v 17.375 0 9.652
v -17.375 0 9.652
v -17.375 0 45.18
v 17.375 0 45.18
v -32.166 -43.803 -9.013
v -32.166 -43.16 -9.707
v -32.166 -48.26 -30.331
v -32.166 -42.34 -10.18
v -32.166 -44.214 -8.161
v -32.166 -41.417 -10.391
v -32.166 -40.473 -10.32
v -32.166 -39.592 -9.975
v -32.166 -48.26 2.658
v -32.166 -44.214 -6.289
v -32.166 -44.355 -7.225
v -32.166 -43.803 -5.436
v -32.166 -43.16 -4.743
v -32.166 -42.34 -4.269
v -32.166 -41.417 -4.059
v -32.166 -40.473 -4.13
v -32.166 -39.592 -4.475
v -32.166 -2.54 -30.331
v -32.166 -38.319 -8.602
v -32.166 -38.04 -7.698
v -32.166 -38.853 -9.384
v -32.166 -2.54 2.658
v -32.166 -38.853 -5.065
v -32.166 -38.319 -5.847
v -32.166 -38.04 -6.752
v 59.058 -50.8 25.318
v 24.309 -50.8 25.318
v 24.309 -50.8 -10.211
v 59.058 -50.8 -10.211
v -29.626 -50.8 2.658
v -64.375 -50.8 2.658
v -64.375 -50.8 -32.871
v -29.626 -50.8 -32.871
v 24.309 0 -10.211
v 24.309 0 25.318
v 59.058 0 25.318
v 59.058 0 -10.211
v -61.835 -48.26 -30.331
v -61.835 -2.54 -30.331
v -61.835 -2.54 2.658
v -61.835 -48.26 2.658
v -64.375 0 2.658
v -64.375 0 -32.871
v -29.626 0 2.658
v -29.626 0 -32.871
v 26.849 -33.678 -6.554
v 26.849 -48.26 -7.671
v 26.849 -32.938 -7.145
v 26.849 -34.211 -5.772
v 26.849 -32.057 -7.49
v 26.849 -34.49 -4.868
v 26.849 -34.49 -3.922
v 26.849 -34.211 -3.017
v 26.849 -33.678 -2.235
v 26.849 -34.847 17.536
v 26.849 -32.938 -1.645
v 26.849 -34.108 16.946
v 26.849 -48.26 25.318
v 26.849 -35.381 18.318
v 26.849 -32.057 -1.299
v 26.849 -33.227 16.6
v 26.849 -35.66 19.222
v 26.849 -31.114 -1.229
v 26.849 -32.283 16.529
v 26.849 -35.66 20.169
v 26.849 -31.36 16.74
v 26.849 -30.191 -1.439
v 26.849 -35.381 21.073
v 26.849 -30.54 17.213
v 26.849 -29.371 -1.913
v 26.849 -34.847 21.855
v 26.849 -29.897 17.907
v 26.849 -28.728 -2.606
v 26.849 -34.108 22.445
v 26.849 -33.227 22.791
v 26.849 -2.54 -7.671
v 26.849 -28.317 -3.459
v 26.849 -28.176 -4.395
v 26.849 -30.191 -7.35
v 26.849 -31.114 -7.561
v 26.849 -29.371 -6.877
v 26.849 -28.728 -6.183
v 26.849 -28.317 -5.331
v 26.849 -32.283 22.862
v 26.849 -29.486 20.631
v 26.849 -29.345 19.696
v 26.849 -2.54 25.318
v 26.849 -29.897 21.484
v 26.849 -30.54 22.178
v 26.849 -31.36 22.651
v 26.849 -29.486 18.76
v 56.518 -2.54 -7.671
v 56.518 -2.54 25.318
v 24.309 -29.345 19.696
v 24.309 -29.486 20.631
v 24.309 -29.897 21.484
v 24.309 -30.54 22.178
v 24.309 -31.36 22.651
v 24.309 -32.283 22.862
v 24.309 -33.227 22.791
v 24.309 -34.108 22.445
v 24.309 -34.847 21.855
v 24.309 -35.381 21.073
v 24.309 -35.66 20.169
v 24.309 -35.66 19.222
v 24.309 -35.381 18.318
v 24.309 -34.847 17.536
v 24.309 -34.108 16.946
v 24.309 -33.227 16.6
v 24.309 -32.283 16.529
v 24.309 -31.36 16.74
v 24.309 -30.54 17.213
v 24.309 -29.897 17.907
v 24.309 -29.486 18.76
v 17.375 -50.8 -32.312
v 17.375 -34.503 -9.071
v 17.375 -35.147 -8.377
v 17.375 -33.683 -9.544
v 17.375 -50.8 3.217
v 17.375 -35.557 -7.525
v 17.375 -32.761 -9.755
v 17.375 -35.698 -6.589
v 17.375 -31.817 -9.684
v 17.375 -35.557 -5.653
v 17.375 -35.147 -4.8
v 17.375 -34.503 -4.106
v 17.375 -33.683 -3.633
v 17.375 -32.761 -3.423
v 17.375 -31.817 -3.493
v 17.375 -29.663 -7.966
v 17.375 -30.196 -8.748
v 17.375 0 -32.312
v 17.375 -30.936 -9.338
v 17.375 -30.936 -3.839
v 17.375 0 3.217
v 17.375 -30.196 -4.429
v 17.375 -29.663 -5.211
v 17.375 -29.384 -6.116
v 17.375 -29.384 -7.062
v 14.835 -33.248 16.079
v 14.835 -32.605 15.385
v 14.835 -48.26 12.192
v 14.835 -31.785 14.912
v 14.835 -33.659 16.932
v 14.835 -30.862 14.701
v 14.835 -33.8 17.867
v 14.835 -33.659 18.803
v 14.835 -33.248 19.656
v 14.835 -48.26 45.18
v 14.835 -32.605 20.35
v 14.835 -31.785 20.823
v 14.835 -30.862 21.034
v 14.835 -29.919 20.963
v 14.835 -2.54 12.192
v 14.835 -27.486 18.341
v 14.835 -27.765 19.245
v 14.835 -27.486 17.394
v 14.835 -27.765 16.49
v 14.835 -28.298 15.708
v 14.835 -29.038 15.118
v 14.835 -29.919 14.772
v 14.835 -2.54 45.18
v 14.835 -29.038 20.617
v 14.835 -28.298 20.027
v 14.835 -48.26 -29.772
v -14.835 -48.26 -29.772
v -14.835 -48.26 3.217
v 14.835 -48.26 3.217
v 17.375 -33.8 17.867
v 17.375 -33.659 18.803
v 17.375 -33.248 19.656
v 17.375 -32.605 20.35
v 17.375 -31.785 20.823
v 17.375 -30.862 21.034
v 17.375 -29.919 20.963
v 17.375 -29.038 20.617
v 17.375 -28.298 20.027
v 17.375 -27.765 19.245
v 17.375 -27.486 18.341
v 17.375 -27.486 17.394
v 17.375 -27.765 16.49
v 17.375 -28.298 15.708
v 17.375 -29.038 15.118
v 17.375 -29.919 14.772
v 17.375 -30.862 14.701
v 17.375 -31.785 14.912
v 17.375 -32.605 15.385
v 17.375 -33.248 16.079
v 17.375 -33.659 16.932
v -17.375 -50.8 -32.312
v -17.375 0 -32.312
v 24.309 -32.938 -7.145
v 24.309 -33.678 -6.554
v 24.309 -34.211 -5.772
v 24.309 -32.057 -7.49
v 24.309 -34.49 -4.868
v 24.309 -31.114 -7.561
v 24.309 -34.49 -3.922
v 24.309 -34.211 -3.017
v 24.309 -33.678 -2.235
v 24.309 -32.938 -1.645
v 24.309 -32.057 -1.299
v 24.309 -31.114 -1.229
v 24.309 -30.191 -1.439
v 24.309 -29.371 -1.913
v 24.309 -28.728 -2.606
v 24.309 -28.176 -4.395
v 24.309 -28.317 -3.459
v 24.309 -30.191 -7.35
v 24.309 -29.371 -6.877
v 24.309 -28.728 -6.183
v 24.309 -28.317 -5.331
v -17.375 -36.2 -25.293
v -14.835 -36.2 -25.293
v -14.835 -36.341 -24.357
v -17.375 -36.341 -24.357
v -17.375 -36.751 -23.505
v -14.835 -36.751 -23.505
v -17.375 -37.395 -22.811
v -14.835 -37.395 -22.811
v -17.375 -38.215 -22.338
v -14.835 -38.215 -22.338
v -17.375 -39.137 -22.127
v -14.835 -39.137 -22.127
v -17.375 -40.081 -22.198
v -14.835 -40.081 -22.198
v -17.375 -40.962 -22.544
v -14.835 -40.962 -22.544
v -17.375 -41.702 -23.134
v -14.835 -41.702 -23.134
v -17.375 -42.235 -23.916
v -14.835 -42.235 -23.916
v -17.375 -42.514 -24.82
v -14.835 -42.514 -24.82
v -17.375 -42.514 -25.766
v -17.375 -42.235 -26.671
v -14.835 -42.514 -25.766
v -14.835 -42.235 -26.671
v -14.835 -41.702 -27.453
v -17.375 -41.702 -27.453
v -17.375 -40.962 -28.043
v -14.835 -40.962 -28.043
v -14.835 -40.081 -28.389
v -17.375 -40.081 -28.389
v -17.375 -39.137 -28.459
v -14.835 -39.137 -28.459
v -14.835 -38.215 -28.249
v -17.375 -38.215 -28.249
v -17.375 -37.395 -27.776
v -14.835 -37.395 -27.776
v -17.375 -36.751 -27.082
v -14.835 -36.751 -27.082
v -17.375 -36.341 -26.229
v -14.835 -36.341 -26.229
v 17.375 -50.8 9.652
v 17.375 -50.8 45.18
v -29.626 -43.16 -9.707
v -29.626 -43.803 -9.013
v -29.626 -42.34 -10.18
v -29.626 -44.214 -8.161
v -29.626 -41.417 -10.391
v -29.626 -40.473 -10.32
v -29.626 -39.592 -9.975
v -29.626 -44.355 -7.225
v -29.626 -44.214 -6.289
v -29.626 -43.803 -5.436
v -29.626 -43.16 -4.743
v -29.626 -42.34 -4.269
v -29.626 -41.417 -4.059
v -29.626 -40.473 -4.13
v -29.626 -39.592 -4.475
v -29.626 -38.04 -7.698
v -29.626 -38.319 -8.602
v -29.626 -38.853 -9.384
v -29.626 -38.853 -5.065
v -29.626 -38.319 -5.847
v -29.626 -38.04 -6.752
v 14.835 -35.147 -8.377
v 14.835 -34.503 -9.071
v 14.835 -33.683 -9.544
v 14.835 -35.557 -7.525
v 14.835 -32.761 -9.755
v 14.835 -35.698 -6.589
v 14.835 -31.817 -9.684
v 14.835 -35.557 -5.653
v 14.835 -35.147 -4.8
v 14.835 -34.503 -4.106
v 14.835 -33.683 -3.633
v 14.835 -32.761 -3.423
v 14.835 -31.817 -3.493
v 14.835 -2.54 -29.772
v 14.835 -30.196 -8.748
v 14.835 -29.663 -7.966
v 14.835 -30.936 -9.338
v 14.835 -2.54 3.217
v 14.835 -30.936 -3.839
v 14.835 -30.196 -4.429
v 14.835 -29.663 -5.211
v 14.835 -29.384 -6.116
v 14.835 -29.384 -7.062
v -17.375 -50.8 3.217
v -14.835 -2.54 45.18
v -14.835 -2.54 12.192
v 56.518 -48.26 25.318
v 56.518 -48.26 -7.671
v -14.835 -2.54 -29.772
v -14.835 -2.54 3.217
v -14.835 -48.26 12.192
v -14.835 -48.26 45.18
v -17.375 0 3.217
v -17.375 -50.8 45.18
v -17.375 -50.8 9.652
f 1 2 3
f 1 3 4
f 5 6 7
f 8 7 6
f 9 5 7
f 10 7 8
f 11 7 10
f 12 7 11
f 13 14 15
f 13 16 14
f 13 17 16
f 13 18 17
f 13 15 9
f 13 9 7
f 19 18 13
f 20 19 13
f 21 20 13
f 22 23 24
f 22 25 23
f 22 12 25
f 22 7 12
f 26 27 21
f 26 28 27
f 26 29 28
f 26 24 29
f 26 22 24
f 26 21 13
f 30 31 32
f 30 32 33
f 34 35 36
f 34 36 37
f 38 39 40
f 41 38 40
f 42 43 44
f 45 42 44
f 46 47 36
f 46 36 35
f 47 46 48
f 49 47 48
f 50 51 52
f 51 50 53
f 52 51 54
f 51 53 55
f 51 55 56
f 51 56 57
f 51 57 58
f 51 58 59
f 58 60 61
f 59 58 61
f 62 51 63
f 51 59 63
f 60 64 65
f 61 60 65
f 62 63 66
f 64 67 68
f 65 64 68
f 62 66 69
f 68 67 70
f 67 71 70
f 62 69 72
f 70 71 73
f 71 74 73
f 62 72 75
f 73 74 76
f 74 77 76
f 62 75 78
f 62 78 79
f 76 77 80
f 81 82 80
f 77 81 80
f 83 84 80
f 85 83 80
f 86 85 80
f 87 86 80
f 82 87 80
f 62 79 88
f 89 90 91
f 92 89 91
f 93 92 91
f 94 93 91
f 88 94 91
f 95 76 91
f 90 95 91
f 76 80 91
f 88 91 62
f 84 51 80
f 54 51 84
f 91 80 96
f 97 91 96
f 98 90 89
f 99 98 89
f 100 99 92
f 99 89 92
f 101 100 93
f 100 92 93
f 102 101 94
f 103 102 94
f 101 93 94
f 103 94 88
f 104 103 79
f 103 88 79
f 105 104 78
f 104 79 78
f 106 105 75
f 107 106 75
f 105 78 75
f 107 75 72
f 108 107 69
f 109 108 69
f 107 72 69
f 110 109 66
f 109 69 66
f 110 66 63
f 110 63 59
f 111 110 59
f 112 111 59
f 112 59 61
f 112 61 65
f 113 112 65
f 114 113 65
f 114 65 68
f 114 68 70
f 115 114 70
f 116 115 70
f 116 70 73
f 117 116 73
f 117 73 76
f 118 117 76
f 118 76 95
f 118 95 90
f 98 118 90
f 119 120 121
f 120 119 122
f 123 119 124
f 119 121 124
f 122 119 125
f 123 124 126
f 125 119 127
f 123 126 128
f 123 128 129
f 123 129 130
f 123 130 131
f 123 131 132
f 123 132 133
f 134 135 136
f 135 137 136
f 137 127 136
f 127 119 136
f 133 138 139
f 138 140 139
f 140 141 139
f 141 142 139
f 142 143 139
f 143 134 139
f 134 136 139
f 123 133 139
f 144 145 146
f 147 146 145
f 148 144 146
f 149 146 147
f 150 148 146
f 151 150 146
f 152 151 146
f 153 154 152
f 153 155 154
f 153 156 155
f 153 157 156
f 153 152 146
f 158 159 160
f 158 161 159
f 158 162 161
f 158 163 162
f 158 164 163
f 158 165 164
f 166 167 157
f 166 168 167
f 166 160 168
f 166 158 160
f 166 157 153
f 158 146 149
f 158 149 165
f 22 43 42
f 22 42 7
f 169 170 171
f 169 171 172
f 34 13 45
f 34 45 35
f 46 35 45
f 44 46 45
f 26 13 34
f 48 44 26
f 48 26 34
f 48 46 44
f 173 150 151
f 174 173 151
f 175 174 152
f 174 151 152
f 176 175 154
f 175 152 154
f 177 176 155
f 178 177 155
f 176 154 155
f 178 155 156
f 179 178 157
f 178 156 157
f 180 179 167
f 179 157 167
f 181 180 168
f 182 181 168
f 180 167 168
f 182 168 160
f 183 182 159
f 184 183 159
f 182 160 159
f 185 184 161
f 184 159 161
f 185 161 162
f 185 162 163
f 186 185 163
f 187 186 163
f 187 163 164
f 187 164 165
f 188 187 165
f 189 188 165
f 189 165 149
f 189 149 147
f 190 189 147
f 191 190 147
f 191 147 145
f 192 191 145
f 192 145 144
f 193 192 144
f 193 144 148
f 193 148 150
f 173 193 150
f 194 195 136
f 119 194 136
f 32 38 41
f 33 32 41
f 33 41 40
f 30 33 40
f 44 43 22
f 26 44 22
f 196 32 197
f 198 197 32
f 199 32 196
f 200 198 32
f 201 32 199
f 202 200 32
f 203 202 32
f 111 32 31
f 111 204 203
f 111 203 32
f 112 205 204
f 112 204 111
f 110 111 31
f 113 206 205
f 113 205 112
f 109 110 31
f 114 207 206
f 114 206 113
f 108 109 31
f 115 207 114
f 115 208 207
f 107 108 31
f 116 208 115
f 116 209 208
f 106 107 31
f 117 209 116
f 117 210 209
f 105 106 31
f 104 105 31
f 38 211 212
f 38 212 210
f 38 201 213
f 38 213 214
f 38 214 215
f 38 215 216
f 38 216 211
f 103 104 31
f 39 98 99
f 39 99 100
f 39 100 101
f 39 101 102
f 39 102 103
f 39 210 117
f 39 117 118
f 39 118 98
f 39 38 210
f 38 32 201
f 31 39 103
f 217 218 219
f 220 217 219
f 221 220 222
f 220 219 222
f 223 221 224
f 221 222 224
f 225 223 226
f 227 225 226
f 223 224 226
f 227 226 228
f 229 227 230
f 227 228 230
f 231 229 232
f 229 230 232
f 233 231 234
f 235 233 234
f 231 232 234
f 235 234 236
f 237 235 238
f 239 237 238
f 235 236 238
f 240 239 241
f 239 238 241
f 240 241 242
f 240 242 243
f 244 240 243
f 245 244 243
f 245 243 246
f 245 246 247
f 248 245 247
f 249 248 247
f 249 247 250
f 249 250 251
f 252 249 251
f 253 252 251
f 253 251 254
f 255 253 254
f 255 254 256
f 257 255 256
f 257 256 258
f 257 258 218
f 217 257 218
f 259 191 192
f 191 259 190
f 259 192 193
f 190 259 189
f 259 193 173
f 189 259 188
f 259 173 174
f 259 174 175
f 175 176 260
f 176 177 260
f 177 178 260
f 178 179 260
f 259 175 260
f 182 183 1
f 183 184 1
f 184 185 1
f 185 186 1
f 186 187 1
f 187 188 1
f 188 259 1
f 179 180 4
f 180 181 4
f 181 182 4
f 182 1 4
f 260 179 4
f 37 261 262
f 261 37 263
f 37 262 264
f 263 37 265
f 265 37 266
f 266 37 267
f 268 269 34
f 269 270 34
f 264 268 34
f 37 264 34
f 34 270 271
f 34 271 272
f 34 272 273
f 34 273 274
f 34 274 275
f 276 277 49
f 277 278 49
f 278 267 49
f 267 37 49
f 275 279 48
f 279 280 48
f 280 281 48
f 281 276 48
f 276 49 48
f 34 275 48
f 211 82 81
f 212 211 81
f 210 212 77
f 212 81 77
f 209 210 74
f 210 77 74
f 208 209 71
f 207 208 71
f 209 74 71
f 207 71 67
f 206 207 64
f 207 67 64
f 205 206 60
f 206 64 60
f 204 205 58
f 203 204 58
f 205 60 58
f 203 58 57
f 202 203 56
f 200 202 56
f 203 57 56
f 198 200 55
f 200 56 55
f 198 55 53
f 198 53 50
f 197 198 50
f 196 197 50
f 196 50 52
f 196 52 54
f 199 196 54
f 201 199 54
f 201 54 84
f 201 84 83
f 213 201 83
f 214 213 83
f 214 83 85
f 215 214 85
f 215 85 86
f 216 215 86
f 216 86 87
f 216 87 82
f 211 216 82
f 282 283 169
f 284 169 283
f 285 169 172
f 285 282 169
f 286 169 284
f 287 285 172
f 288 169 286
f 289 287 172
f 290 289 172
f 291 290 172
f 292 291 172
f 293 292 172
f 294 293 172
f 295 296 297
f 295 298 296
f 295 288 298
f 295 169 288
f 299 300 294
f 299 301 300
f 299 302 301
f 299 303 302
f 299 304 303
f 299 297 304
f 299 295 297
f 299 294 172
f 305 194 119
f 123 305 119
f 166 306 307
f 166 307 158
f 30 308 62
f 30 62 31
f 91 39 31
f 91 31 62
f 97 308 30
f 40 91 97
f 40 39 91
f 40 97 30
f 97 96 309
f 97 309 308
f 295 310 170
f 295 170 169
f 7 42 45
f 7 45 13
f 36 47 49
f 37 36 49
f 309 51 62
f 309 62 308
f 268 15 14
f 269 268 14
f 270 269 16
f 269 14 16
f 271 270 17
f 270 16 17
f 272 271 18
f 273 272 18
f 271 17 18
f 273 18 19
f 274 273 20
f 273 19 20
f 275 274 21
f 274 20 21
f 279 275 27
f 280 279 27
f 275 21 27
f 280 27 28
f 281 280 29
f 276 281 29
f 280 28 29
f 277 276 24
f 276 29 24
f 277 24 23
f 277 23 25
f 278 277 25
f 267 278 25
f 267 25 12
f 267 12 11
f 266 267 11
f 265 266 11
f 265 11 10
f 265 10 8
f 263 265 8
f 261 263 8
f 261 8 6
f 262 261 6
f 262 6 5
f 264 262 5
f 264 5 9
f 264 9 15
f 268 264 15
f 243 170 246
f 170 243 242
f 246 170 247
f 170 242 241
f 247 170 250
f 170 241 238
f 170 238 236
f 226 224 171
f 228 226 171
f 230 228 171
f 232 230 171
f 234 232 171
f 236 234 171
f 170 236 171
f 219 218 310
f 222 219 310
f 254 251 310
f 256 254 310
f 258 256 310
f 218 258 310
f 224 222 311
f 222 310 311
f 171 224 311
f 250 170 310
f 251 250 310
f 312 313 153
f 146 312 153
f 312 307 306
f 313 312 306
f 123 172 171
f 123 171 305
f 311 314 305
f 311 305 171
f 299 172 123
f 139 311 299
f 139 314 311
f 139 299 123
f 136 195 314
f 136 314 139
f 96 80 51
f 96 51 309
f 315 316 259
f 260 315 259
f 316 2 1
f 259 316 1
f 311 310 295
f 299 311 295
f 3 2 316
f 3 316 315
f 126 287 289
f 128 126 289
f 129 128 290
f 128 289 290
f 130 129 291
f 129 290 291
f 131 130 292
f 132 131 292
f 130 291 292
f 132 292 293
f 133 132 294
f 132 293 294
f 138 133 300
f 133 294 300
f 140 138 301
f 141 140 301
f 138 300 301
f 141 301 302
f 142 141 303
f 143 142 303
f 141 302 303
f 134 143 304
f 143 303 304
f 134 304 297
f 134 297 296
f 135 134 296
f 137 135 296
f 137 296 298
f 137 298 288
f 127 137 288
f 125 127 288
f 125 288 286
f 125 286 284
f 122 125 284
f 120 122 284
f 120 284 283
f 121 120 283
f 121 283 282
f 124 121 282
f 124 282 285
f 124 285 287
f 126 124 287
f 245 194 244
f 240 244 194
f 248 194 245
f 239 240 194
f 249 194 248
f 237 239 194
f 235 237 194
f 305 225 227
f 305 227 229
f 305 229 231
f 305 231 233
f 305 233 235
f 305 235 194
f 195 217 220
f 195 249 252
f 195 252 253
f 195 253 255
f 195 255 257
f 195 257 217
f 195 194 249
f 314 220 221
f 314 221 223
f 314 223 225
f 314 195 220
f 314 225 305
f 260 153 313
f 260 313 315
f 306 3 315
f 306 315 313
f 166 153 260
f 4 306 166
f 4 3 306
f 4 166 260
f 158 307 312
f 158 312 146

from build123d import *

# Parameters (mm, degrees)
F0_W      = 34.7495928857
F0_H      = 35.5289168656
F4_DEPTH  = 50.8
F1_W      = 34.7495928857
F1_H      = 35.5289168656
F2_W      = 34.7495928857
F2_H      = 35.5289168656
F3_W      = 34.7495928857
F3_H      = 35.5289168656
F5_T      = -2.54
F5_2_T    = -2.54
F5_3_T    = -2.54
F5_4_T    = -2.54
F7_D      = 6.35
F7_DEPTH  = 12.7
F7_TIP    = 1.9077324654
F9_D      = 6.35
F9_DEPTH  = 12.7
F9_TIP    = 1.9077324654
F11_D     = 6.35
F11_DEPTH = 12.7
F11_TIP   = 1.9077324654
F13_D     = 6.35
F13_DEPTH = 12.7
F13_TIP   = 1.9077324654
F15_D     = 6.35
F15_DEPTH = 12.7
F15_TIP   = 1.9077324654
F17_D     = 6.35
F17_DEPTH = 12.7
F17_TIP   = 1.9077324654


with BuildPart() as f4:
    # F0 (on Front) → F4 (new body)
    with BuildSketch(Plane.XZ):
        with Locations((0, 27.4160150439)):
            Rectangle(F0_W, F0_H)
    extrude(amount=F4_DEPTH)

    # F5#3
    f5_3_openings = [f4.faces().sort_by_distance(p)[0] for p in [
        (0, -25.4, 45.180473),
    ]]
    offset(amount=F5_3_T, openings=f5_3_openings)

    # F7
    with Locations(Plane.YZ.offset(17.3747964428)):
        with Locations((-30.6251663715, 17.8674012423)):
            Hole(F7_D / 2, depth=F7_DEPTH)
            with Locations((0, 0, -(F7_DEPTH + F7_TIP / 2))):  # 118° drill point
                Cone(0, F7_D / 2, F7_TIP, mode=Mode.SUBTRACT)


with BuildPart() as f4b:
    # F1 (on Front) → F4, piece 2 (new body)
    with BuildSketch(Plane.XZ):
        with Locations((41.6835285723, 7.5533916242)):
            Rectangle(F1_W, F1_H)
    extrude(amount=F4_DEPTH)

    # F5#4
    f5_4_openings = [f4b.faces().sort_by_distance(p)[0] for p in [
        (41.683529, -25.4, 25.31785),
    ]]
    offset(amount=F5_4_T, openings=f5_4_openings)

    # F9
    with Locations(Plane(origin=(24.3087321295, 0, 0), x_dir=(0, -1, 0), z_dir=(-1, 0, 0))):
        with Locations((32.5200334191, 19.6956023574)):
            Hole(F9_D / 2, depth=F9_DEPTH)
            with Locations((0, 0, -(F9_DEPTH + F9_TIP / 2))):  # 118° drill point
                Cone(0, F9_D / 2, F9_TIP, mode=Mode.SUBTRACT)

    # F11
    with Locations(Plane(origin=(24.3087321295, 0, 0), x_dir=(0, -1, 0), z_dir=(-1, 0, 0))):
        with Locations((31.3509069383, -4.3948837556)):
            Hole(F11_D / 2, depth=F11_DEPTH)
            with Locations((0, 0, -(F11_DEPTH + F11_TIP / 2))):  # 118° drill point
                Cone(0, F11_D / 2, F11_TIP, mode=Mode.SUBTRACT)


with BuildPart() as f4c:
    # F2 (on Front) → F4, piece 3 (new body)
    with BuildSketch(Plane.XZ):
        with Locations((0, -14.5472735167)):
            Rectangle(F2_W, F2_H)
    extrude(amount=F4_DEPTH)

    # F5#2
    f5_2_openings = [f4c.faces().sort_by_distance(p)[0] for p in [
        (0, -25.4, 3.217185),
    ]]
    offset(amount=F5_2_T, openings=f5_2_openings)

    # F13
    with Locations(Plane.YZ.offset(17.3747964428)):
        with Locations((-32.5233004987, -6.5888143145)):
            Hole(F13_D / 2, depth=F13_DEPTH)
            with Locations((0, 0, -(F13_DEPTH + F13_TIP / 2))):  # 118° drill point
                Cone(0, F13_D / 2, F13_TIP, mode=Mode.SUBTRACT)

    # F15
    with Locations(Plane(origin=(-17.3747964428, 0, 0), x_dir=(0, -1, 0), z_dir=(-1, 0, 0))):
        with Locations((39.3745787442, -25.2931974828)):
            Hole(F15_D / 2, depth=F15_DEPTH)
            with Locations((0, 0, -(F15_DEPTH + F15_TIP / 2))):  # 118° drill point
                Cone(0, F15_D / 2, F15_TIP, mode=Mode.SUBTRACT)


with BuildPart() as f4d:
    # F3 (on Front) → F4, piece 4 (new body)
    with BuildSketch(Plane.XZ):
        with Locations((-47.0004864037, -15.1067832485)):
            Rectangle(F3_W, F3_H)
    extrude(amount=F4_DEPTH)

    # F5
    f5_openings = [f4d.faces().sort_by_distance(p)[0] for p in [
        (-47.000486, -25.4, 2.657675),
    ]]
    offset(amount=F5_T, openings=f5_openings)

    # F17
    with Locations(Plane.YZ.offset(-29.6256899609)):
        with Locations((-41.1799475551, -7.2249141522)):
            Hole(F17_D / 2, depth=F17_DEPTH)
            with Locations((0, 0, -(F17_DEPTH + F17_TIP / 2))):  # 118° drill point
                Cone(0, F17_D / 2, F17_TIP, mode=Mode.SUBTRACT)


solid = Compound([f4.part, f4b.part, f4c.part, f4d.part])
